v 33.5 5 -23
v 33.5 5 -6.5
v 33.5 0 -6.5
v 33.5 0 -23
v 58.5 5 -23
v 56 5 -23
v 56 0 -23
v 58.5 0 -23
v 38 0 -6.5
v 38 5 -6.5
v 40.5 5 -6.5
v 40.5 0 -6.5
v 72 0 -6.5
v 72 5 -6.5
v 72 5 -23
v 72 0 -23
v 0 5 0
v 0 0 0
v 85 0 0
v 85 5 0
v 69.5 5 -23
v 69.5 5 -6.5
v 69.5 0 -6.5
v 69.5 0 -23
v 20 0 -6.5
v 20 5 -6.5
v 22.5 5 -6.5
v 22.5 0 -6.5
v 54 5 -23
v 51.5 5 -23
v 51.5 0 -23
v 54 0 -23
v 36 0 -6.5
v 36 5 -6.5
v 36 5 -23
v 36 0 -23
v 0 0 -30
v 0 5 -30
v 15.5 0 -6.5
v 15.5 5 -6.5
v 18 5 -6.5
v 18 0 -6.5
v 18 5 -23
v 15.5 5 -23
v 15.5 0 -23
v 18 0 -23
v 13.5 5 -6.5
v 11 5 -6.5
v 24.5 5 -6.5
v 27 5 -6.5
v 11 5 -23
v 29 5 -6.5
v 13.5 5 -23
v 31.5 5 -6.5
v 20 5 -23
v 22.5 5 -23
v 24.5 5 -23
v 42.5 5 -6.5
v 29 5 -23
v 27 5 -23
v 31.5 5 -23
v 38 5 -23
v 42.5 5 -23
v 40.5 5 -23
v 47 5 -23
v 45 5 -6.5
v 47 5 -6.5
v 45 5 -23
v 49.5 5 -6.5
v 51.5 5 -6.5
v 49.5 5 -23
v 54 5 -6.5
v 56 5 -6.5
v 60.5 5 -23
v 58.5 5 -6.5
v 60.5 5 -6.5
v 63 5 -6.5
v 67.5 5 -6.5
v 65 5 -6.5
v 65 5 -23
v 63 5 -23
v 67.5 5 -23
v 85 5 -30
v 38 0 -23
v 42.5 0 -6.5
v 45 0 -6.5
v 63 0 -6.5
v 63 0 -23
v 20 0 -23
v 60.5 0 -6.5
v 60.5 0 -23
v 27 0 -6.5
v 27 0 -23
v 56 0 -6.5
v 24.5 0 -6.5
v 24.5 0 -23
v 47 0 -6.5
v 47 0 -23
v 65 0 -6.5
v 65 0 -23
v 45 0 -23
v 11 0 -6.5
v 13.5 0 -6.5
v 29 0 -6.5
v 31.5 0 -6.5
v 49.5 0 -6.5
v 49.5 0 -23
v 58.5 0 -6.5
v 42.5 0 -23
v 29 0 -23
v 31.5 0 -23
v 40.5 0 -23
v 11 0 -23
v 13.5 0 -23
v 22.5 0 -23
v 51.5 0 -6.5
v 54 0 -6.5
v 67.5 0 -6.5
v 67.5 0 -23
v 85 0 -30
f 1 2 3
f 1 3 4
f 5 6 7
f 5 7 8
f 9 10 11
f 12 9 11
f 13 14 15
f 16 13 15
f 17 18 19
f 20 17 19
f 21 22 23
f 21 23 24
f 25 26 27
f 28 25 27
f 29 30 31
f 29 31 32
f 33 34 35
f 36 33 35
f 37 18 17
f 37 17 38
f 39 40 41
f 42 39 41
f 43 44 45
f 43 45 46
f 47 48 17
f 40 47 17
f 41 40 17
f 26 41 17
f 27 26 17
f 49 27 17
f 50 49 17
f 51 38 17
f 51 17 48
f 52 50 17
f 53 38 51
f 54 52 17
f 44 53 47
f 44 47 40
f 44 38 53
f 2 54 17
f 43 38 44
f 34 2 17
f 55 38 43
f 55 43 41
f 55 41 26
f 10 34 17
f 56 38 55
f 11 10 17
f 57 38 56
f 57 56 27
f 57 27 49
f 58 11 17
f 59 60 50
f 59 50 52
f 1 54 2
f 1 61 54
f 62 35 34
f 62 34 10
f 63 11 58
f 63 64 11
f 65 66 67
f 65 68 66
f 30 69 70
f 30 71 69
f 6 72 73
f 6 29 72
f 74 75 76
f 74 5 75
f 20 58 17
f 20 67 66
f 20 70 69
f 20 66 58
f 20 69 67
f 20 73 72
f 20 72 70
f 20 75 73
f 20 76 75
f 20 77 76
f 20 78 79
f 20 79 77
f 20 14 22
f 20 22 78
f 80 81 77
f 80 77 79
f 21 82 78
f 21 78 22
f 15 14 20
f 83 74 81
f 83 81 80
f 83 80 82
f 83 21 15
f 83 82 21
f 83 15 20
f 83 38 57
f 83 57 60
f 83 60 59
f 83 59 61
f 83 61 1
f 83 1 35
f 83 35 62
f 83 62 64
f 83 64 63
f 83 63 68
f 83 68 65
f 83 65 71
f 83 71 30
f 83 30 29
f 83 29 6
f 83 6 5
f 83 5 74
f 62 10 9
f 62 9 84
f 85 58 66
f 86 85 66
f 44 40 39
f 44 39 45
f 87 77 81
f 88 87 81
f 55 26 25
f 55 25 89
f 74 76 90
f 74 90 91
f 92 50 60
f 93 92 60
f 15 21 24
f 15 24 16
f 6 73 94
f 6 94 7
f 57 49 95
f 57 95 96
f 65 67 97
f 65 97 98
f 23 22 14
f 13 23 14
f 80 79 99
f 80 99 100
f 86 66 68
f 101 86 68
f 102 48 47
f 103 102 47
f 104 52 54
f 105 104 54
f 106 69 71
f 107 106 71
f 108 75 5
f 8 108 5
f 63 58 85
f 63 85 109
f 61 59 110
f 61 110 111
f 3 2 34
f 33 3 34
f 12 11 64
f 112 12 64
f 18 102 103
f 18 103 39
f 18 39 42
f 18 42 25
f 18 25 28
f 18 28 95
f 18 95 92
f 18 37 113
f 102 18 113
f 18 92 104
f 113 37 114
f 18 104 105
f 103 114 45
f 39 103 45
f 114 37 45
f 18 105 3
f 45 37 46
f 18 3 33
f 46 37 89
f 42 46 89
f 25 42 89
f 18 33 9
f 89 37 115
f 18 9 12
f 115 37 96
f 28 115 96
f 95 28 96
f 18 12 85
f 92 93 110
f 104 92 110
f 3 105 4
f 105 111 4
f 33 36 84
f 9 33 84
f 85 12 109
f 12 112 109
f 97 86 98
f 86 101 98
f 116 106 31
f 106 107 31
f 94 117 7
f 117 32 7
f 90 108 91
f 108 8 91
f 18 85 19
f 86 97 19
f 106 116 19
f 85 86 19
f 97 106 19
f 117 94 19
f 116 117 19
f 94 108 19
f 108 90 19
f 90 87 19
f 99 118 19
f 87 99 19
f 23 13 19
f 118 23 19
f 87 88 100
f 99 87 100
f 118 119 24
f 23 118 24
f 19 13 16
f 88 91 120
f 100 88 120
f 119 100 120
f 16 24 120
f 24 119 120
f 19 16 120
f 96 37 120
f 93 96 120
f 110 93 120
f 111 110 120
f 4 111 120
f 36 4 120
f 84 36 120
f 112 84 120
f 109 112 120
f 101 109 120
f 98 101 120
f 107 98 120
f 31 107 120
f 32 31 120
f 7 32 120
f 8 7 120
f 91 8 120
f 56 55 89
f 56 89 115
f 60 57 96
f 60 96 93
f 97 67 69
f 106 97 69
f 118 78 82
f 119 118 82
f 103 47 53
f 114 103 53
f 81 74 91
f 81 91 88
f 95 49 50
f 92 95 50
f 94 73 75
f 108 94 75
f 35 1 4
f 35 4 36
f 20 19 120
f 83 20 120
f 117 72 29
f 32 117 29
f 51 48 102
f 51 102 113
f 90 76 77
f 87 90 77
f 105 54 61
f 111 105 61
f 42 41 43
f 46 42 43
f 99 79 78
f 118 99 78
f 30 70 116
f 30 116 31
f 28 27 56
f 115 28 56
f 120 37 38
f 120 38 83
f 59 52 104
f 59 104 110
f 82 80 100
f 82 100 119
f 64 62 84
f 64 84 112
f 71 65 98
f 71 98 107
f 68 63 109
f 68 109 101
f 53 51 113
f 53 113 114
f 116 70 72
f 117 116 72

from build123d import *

# Parameters (mm, degrees)
SKETCH1_W           = 85
SKETCH1_H           = 30
BOSS_EXTRUDE1_DEPTH = 5
SKETCH2_W           = 2.5
SKETCH2_H           = 16.5
CUT_EXTRUDE1_DEPTH  = 5


with BuildPart() as part:
    # Sketch1 → Boss-Extrude1 (new body)
    with BuildSketch(Plane(origin=(0, 0, 0), x_dir=(1, 0, 0), z_dir=(0, 1, 0))):
        with Locations((42.5, 15)):
            Rectangle(SKETCH1_W, SKETCH1_H)
    extrude(amount=BOSS_EXTRUDE1_DEPTH)

    # Sketch2 → Cut-Extrude1 (cut)
    with BuildSketch(Plane(origin=(0, 5, 0), x_dir=(1, 0, 0), z_dir=(0, 1, 0))):
        with Locations((12.25, 14.75)):
            Rectangle(SKETCH2_W, SKETCH2_H)
        with Locations((16.75, 14.75)):
            Rectangle(SKETCH2_W, SKETCH2_H)
        with Locations((21.25, 14.75)):
            Rectangle(SKETCH2_W, SKETCH2_H)
        with Locations((25.75, 14.75)):
            Rectangle(SKETCH2_W, SKETCH2_H)
        with Locations((30.25, 14.75)):
            Rectangle(SKETCH2_W, SKETCH2_H)
        with Locations((34.75, 14.75)):
            Rectangle(SKETCH2_W, SKETCH2_H)
        with Locations((39.25, 14.75)):
            Rectangle(SKETCH2_W, SKETCH2_H)
        with Locations((43.75, 14.75)):
            Rectangle(SKETCH2_W, SKETCH2_H)
        with Locations((48.25, 14.75)):
            Rectangle(SKETCH2_W, SKETCH2_H)
        with Locations((52.75, 14.75)):
            Rectangle(SKETCH2_W, SKETCH2_H)
        with Locations((57.25, 14.75)):
            Rectangle(SKETCH2_W, SKETCH2_H)
        with Locations((61.75, 14.75)):
            Rectangle(SKETCH2_W, SKETCH2_H)
        with Locations((66.25, 14.75)):
            Rectangle(SKETCH2_W, SKETCH2_H)
        with Locations((70.75, 14.75)):
            Rectangle(SKETCH2_W, SKETCH2_H)
    extrude(amount=-CUT_EXTRUDE1_DEPTH, mode=Mode.SUBTRACT)


solid = part.part
